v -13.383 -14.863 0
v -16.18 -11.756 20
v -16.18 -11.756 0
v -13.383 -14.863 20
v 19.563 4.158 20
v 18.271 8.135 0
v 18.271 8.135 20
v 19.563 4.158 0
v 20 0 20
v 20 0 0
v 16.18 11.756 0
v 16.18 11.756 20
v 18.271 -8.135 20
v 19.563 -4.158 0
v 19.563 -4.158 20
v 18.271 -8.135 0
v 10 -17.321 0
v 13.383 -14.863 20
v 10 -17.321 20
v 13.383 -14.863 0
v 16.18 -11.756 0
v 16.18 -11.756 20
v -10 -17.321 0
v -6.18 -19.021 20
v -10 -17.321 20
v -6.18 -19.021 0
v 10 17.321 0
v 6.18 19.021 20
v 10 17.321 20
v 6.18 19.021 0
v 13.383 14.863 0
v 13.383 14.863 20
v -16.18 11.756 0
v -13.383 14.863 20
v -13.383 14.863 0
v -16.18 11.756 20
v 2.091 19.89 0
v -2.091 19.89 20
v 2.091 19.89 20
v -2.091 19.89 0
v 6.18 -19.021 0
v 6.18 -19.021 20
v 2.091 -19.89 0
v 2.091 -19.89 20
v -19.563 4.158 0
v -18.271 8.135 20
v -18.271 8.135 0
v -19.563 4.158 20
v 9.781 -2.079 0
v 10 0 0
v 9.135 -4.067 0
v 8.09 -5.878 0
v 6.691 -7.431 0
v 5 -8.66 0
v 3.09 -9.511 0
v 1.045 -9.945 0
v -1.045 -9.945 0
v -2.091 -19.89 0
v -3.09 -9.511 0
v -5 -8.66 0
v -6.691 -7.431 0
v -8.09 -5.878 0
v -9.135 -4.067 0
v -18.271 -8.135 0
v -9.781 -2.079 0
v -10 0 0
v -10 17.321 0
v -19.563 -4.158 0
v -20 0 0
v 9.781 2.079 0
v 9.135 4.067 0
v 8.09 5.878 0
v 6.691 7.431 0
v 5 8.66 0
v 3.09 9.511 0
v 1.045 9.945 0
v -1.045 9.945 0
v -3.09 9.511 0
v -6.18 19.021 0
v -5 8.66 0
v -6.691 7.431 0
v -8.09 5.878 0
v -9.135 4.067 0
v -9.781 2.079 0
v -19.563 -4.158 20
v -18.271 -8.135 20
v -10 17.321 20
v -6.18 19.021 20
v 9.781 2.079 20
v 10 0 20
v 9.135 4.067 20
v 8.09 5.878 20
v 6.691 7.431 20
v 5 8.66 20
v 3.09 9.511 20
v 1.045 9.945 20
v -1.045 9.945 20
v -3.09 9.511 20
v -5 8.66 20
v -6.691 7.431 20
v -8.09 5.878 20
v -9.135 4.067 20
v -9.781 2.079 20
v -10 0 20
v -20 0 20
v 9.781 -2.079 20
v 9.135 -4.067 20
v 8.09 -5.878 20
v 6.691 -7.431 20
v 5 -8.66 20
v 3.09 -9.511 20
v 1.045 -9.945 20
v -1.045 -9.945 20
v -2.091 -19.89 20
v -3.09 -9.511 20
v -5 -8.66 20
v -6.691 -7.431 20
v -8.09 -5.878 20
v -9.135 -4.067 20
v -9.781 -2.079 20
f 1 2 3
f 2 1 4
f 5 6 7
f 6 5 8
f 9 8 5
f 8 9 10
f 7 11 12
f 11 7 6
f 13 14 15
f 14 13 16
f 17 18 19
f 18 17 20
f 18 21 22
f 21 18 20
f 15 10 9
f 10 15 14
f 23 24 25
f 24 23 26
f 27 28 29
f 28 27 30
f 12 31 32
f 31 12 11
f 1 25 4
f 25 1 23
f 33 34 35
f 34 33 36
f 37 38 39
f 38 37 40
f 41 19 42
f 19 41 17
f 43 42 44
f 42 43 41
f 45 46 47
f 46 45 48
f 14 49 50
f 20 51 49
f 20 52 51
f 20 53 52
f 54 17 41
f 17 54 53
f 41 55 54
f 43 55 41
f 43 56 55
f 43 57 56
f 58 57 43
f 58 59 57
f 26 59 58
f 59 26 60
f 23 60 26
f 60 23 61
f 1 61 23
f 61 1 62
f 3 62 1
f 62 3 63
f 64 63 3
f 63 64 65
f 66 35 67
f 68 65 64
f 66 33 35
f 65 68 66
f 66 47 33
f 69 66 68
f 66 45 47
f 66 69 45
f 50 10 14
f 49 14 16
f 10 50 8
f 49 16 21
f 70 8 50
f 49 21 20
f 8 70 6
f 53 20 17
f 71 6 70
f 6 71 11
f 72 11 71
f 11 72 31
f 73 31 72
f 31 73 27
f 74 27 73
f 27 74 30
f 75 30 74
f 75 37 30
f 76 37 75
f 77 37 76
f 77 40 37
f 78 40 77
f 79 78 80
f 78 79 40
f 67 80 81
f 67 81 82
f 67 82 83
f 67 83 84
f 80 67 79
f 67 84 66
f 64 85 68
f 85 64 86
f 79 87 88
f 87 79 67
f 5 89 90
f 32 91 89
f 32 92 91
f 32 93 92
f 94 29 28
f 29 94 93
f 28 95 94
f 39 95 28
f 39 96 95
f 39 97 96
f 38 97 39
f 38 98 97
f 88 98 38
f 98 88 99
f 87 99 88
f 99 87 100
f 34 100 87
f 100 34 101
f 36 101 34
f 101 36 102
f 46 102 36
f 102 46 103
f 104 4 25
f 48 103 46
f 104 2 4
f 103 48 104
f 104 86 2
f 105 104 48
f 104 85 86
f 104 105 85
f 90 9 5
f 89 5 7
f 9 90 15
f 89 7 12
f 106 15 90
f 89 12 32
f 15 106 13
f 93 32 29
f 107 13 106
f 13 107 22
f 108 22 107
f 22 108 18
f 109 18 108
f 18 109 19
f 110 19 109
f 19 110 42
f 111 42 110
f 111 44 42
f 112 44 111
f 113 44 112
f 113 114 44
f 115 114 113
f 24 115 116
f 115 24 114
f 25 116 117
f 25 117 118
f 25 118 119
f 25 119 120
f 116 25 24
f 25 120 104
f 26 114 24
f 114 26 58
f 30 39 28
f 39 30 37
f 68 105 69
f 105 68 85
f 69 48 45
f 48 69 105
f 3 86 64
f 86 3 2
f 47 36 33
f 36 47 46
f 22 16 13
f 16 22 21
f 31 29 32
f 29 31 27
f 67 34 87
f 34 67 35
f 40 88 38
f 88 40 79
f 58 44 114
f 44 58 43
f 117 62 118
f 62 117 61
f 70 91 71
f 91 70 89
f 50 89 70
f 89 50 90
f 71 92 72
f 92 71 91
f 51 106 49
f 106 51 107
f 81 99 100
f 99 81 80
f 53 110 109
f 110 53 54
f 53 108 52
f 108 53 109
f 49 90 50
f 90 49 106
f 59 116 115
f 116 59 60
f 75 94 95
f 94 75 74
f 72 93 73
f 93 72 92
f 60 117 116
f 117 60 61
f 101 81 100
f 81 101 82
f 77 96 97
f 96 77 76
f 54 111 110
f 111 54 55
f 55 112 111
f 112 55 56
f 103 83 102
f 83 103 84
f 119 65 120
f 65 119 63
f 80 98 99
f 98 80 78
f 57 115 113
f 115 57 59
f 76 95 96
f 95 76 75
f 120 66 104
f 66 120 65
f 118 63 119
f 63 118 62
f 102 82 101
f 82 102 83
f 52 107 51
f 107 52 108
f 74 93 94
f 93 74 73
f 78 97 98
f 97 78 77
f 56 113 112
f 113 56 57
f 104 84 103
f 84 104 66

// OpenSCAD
//$fn=60;

difference(){
    cylinder(r=20,h=20);
    translate([0,0,-5]) cylinder(r=10,h=40);
}
